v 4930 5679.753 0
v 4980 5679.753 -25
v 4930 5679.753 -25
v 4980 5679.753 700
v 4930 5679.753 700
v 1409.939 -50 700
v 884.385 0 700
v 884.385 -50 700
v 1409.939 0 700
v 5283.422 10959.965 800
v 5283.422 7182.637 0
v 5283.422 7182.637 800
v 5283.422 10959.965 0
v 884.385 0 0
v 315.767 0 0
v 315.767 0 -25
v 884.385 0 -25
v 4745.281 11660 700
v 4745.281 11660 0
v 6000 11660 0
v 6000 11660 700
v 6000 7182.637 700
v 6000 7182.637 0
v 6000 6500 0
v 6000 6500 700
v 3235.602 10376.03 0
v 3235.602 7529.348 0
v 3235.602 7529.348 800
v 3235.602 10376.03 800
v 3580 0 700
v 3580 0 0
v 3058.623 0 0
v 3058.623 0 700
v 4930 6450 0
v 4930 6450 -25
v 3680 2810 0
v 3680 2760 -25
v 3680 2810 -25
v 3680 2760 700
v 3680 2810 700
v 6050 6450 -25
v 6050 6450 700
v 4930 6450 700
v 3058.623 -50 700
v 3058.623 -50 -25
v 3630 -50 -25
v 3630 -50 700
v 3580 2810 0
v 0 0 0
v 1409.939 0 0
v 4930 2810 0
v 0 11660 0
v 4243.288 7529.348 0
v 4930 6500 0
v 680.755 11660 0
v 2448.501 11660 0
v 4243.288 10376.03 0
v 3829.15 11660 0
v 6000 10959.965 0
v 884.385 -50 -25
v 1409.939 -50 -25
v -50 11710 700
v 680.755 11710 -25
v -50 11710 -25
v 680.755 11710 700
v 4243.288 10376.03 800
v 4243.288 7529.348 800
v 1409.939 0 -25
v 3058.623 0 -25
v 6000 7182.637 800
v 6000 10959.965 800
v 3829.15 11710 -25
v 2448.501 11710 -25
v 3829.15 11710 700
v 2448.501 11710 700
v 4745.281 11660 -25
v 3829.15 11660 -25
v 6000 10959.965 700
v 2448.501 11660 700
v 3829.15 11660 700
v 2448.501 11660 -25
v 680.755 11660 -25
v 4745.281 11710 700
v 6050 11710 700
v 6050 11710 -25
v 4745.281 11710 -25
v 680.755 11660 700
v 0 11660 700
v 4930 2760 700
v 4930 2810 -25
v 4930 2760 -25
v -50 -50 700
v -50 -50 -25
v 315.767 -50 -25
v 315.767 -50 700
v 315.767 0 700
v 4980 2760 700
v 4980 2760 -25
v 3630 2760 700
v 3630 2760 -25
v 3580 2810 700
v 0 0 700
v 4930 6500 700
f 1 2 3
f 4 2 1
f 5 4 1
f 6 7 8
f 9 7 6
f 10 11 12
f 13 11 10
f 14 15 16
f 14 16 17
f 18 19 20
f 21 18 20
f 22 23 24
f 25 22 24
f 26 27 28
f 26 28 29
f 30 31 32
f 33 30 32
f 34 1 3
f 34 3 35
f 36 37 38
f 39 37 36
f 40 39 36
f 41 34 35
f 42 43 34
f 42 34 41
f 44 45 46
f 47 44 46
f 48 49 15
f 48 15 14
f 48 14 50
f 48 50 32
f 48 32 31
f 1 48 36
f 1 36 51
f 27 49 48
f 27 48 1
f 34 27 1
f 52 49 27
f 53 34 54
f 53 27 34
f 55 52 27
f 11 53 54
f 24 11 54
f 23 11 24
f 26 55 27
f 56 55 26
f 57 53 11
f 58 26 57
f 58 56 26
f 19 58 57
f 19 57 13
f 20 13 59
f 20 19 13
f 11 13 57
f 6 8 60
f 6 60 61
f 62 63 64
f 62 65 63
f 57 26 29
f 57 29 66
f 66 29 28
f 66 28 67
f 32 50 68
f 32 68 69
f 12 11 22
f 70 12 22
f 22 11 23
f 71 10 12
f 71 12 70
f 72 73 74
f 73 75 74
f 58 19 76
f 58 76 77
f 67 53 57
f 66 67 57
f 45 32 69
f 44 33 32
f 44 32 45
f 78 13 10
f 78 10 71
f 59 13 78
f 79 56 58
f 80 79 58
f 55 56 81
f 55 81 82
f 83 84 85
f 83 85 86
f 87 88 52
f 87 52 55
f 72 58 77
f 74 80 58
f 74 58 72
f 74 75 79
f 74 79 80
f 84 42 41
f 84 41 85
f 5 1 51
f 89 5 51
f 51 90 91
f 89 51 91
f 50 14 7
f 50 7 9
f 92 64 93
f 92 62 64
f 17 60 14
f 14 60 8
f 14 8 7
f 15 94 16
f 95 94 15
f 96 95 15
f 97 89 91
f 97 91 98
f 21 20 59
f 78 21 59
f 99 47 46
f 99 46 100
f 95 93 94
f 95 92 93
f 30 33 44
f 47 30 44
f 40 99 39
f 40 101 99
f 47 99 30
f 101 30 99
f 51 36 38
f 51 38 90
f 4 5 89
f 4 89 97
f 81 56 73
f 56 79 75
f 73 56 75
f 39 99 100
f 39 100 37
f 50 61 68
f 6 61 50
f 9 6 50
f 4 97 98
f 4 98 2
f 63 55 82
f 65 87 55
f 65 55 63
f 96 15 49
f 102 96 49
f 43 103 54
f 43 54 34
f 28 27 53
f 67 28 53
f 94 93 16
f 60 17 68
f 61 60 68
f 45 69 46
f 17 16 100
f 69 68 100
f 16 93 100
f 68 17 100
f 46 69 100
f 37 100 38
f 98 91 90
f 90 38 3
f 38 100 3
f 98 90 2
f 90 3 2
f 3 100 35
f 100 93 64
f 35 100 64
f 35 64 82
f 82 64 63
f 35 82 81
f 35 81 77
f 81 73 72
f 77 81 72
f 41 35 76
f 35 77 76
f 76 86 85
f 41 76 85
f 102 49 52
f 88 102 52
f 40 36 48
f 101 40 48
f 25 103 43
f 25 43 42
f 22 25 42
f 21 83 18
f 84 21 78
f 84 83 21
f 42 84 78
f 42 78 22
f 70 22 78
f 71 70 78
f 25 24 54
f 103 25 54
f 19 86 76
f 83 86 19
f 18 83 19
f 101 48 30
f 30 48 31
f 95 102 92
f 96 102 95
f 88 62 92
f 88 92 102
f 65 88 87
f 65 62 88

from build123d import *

# Parameters (mm, degrees)
F0_W          = 1007.6858997345
F0_H          = 2846.6820716858
F1_DEPTH      = 25
F0_W_2        = 50
F0_H_2        = 11660
F0_W_3        = 680.754840374
F0_H_3        = 50
F0_W_4        = 525.554060936
F0_W_5        = 1380.6488513947
F2_DEPTH      = 700
F2_DEPTH_BACK = 25
F0_W_6        = 716.5780067444
F0_H_4        = 3777.3280143738
F3_DEPTH      = 800
F3_DEPTH_BACK = 25


with BuildPart() as f1:
    # F0 (on Top) → F1 (new body)
    with BuildSketch(Plane.XY):
        Polygon((0, 11660), (0, 0), (315.7672286034, 0), (884.3851089478, 0), (1409.9391698837, 0), (3058.6225986481, 0), (3580, 0), (3580, 2810), (3630, 2810), (3680, 2810), (4930, 2810), (4930, 5679.7533035278), (4930, 6450), (4930, 6500), (5082.5057029724, 6500), (6000, 6500), (6000, 7182.6367378235), (5283.4219932556, 7182.6367378235), (5283.4219932556, 10959.9647521973), (6000, 10959.9647521973), (6000, 11660), (4745.2807426453, 11660), (3829.149723053, 11660), (2448.5008716583, 11660), (680.754840374, 11660), align=None)
        with Locations((3739.4448518753, 8952.6889324188)):
            Rectangle(F0_W, F0_H, mode=Mode.SUBTRACT)
    extrude(amount=-F1_DEPTH)

    # F0 (on Top) → F2 (join, two sides)
    with BuildSketch(Plane.XY) as f2_sk:
        with Locations((-25, 5830)):
            Rectangle(F0_W_2, F0_H_2)
        Polygon((315.7672286034, 0), (0, 0), (-50, 0), (-50, -50), (315.7672286034, -50), align=None)
        with Locations((340.377420187, 11685)):
            Rectangle(F0_W_3, F0_H_3)
        with Locations((-25, 11685)):
            Rectangle(F0_W_2, F0_H_3)
        with Locations((1147.1621394157, -25)):
            Rectangle(F0_W_4, F0_H_3)
        with Locations((3138.8252973557, 11685)):
            Rectangle(F0_W_5, F0_H_3)
        Polygon((3580, 0), (3058.6225986481, 0), (3058.6225986481, -50), (3630, -50), (3630, 0), align=None)
        Polygon((4745.2807426453, 11710), (4745.2807426453, 11660), (6000, 11660), (6050, 11660), (6050, 11710), align=None)
        Polygon((3580, 2810), (3580, 0), (3630, 0), (3630, 2760), (3630, 2810), align=None)
        Polygon((6050, 11660), (6000, 11660), (6000, 10959.9647521973), (6000, 7182.6367378235), (6000, 6500), (6000, 6450), (6050, 6450), align=None)
        with Locations((3655, 2785)):
            Rectangle(F0_W_2, F0_H_3)
        Polygon((6000, 6450), (6000, 6500), (5082.5057029724, 6500), (4930, 6500), (4930, 6450), align=None)
        Polygon((4930, 5679.7533035278), (4930, 2810), (4930, 2760), (4980, 2760), (4980, 5679.7533035278), align=None)
    extrude(amount=F2_DEPTH)
    extrude(f2_sk.sketch, amount=-F2_DEPTH_BACK)

    # F0 (on Top) → F3 (join, two sides)
    with BuildSketch(Plane.XY) as f3_sk:
        with Locations((3739.4448518753, 8952.6889324188)):
            Rectangle(F0_W, F0_H)
        with Locations((5641.7109966278, 9071.3007450104)):
            Rectangle(F0_W_6, F0_H_4)
    extrude(amount=F3_DEPTH)
    extrude(f3_sk.sketch, amount=-F3_DEPTH_BACK)


solid = f1.part
